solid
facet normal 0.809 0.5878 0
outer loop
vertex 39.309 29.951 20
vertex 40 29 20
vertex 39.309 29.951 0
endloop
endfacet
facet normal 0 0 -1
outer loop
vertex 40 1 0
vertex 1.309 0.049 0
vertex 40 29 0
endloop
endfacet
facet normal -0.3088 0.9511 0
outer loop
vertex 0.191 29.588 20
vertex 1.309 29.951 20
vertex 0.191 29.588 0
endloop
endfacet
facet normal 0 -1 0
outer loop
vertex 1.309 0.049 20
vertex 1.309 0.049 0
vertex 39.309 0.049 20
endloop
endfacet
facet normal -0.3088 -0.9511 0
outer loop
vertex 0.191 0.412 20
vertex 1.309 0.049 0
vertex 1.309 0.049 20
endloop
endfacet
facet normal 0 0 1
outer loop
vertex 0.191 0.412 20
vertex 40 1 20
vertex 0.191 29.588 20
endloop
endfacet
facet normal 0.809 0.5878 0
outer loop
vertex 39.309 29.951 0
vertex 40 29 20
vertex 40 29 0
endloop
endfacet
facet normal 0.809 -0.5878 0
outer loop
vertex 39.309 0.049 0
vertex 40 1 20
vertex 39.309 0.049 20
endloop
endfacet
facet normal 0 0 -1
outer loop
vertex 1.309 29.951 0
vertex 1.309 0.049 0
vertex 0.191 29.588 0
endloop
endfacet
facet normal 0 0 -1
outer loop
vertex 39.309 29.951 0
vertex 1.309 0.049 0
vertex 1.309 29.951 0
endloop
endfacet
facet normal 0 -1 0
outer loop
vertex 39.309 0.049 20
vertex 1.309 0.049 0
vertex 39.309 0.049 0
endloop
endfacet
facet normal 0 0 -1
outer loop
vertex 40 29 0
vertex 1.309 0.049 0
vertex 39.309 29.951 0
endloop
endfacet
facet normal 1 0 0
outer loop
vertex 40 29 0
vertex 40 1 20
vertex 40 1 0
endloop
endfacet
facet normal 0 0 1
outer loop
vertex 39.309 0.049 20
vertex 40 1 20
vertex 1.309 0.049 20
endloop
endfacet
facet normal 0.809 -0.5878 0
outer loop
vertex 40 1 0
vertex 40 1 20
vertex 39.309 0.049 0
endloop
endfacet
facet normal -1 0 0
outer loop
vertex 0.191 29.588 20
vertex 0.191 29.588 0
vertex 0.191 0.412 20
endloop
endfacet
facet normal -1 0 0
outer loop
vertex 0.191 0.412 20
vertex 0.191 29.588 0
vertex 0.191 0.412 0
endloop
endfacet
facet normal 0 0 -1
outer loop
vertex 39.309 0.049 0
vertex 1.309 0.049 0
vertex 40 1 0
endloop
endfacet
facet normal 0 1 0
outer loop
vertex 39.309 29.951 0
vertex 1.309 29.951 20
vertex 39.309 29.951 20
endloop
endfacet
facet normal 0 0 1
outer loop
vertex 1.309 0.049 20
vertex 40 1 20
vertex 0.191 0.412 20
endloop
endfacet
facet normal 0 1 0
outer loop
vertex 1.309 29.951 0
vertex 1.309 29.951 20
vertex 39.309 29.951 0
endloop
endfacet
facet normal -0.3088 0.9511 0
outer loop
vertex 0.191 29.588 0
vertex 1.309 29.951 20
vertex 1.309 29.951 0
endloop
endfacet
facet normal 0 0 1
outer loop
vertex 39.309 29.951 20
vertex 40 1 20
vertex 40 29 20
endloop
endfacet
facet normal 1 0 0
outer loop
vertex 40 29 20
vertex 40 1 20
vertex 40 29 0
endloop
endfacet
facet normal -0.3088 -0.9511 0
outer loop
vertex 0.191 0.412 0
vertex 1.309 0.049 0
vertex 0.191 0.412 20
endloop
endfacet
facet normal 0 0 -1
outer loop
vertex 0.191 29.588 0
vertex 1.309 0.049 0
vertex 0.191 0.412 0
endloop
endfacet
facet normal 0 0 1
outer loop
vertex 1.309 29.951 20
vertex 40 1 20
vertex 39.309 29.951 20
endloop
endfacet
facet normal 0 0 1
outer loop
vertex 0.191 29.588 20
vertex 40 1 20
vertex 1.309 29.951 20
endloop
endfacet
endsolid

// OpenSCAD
Cube(40,30,20);
module Cube(xdim ,ydim ,zdim,rdim=1) {
 hull(){
  translate([rdim,rdim,0])cylinder(h=zdim,r=rdim);
  translate([xdim-rdim,rdim,0])cylinder(h=zdim,r=rdim);
  translate([rdim,ydim-rdim,0])cylinder(h=zdim,r=rdim);
  translate([xdim-rdim,ydim-rdim,0])cylinder(h=zdim,r=rdim);
 }
}
